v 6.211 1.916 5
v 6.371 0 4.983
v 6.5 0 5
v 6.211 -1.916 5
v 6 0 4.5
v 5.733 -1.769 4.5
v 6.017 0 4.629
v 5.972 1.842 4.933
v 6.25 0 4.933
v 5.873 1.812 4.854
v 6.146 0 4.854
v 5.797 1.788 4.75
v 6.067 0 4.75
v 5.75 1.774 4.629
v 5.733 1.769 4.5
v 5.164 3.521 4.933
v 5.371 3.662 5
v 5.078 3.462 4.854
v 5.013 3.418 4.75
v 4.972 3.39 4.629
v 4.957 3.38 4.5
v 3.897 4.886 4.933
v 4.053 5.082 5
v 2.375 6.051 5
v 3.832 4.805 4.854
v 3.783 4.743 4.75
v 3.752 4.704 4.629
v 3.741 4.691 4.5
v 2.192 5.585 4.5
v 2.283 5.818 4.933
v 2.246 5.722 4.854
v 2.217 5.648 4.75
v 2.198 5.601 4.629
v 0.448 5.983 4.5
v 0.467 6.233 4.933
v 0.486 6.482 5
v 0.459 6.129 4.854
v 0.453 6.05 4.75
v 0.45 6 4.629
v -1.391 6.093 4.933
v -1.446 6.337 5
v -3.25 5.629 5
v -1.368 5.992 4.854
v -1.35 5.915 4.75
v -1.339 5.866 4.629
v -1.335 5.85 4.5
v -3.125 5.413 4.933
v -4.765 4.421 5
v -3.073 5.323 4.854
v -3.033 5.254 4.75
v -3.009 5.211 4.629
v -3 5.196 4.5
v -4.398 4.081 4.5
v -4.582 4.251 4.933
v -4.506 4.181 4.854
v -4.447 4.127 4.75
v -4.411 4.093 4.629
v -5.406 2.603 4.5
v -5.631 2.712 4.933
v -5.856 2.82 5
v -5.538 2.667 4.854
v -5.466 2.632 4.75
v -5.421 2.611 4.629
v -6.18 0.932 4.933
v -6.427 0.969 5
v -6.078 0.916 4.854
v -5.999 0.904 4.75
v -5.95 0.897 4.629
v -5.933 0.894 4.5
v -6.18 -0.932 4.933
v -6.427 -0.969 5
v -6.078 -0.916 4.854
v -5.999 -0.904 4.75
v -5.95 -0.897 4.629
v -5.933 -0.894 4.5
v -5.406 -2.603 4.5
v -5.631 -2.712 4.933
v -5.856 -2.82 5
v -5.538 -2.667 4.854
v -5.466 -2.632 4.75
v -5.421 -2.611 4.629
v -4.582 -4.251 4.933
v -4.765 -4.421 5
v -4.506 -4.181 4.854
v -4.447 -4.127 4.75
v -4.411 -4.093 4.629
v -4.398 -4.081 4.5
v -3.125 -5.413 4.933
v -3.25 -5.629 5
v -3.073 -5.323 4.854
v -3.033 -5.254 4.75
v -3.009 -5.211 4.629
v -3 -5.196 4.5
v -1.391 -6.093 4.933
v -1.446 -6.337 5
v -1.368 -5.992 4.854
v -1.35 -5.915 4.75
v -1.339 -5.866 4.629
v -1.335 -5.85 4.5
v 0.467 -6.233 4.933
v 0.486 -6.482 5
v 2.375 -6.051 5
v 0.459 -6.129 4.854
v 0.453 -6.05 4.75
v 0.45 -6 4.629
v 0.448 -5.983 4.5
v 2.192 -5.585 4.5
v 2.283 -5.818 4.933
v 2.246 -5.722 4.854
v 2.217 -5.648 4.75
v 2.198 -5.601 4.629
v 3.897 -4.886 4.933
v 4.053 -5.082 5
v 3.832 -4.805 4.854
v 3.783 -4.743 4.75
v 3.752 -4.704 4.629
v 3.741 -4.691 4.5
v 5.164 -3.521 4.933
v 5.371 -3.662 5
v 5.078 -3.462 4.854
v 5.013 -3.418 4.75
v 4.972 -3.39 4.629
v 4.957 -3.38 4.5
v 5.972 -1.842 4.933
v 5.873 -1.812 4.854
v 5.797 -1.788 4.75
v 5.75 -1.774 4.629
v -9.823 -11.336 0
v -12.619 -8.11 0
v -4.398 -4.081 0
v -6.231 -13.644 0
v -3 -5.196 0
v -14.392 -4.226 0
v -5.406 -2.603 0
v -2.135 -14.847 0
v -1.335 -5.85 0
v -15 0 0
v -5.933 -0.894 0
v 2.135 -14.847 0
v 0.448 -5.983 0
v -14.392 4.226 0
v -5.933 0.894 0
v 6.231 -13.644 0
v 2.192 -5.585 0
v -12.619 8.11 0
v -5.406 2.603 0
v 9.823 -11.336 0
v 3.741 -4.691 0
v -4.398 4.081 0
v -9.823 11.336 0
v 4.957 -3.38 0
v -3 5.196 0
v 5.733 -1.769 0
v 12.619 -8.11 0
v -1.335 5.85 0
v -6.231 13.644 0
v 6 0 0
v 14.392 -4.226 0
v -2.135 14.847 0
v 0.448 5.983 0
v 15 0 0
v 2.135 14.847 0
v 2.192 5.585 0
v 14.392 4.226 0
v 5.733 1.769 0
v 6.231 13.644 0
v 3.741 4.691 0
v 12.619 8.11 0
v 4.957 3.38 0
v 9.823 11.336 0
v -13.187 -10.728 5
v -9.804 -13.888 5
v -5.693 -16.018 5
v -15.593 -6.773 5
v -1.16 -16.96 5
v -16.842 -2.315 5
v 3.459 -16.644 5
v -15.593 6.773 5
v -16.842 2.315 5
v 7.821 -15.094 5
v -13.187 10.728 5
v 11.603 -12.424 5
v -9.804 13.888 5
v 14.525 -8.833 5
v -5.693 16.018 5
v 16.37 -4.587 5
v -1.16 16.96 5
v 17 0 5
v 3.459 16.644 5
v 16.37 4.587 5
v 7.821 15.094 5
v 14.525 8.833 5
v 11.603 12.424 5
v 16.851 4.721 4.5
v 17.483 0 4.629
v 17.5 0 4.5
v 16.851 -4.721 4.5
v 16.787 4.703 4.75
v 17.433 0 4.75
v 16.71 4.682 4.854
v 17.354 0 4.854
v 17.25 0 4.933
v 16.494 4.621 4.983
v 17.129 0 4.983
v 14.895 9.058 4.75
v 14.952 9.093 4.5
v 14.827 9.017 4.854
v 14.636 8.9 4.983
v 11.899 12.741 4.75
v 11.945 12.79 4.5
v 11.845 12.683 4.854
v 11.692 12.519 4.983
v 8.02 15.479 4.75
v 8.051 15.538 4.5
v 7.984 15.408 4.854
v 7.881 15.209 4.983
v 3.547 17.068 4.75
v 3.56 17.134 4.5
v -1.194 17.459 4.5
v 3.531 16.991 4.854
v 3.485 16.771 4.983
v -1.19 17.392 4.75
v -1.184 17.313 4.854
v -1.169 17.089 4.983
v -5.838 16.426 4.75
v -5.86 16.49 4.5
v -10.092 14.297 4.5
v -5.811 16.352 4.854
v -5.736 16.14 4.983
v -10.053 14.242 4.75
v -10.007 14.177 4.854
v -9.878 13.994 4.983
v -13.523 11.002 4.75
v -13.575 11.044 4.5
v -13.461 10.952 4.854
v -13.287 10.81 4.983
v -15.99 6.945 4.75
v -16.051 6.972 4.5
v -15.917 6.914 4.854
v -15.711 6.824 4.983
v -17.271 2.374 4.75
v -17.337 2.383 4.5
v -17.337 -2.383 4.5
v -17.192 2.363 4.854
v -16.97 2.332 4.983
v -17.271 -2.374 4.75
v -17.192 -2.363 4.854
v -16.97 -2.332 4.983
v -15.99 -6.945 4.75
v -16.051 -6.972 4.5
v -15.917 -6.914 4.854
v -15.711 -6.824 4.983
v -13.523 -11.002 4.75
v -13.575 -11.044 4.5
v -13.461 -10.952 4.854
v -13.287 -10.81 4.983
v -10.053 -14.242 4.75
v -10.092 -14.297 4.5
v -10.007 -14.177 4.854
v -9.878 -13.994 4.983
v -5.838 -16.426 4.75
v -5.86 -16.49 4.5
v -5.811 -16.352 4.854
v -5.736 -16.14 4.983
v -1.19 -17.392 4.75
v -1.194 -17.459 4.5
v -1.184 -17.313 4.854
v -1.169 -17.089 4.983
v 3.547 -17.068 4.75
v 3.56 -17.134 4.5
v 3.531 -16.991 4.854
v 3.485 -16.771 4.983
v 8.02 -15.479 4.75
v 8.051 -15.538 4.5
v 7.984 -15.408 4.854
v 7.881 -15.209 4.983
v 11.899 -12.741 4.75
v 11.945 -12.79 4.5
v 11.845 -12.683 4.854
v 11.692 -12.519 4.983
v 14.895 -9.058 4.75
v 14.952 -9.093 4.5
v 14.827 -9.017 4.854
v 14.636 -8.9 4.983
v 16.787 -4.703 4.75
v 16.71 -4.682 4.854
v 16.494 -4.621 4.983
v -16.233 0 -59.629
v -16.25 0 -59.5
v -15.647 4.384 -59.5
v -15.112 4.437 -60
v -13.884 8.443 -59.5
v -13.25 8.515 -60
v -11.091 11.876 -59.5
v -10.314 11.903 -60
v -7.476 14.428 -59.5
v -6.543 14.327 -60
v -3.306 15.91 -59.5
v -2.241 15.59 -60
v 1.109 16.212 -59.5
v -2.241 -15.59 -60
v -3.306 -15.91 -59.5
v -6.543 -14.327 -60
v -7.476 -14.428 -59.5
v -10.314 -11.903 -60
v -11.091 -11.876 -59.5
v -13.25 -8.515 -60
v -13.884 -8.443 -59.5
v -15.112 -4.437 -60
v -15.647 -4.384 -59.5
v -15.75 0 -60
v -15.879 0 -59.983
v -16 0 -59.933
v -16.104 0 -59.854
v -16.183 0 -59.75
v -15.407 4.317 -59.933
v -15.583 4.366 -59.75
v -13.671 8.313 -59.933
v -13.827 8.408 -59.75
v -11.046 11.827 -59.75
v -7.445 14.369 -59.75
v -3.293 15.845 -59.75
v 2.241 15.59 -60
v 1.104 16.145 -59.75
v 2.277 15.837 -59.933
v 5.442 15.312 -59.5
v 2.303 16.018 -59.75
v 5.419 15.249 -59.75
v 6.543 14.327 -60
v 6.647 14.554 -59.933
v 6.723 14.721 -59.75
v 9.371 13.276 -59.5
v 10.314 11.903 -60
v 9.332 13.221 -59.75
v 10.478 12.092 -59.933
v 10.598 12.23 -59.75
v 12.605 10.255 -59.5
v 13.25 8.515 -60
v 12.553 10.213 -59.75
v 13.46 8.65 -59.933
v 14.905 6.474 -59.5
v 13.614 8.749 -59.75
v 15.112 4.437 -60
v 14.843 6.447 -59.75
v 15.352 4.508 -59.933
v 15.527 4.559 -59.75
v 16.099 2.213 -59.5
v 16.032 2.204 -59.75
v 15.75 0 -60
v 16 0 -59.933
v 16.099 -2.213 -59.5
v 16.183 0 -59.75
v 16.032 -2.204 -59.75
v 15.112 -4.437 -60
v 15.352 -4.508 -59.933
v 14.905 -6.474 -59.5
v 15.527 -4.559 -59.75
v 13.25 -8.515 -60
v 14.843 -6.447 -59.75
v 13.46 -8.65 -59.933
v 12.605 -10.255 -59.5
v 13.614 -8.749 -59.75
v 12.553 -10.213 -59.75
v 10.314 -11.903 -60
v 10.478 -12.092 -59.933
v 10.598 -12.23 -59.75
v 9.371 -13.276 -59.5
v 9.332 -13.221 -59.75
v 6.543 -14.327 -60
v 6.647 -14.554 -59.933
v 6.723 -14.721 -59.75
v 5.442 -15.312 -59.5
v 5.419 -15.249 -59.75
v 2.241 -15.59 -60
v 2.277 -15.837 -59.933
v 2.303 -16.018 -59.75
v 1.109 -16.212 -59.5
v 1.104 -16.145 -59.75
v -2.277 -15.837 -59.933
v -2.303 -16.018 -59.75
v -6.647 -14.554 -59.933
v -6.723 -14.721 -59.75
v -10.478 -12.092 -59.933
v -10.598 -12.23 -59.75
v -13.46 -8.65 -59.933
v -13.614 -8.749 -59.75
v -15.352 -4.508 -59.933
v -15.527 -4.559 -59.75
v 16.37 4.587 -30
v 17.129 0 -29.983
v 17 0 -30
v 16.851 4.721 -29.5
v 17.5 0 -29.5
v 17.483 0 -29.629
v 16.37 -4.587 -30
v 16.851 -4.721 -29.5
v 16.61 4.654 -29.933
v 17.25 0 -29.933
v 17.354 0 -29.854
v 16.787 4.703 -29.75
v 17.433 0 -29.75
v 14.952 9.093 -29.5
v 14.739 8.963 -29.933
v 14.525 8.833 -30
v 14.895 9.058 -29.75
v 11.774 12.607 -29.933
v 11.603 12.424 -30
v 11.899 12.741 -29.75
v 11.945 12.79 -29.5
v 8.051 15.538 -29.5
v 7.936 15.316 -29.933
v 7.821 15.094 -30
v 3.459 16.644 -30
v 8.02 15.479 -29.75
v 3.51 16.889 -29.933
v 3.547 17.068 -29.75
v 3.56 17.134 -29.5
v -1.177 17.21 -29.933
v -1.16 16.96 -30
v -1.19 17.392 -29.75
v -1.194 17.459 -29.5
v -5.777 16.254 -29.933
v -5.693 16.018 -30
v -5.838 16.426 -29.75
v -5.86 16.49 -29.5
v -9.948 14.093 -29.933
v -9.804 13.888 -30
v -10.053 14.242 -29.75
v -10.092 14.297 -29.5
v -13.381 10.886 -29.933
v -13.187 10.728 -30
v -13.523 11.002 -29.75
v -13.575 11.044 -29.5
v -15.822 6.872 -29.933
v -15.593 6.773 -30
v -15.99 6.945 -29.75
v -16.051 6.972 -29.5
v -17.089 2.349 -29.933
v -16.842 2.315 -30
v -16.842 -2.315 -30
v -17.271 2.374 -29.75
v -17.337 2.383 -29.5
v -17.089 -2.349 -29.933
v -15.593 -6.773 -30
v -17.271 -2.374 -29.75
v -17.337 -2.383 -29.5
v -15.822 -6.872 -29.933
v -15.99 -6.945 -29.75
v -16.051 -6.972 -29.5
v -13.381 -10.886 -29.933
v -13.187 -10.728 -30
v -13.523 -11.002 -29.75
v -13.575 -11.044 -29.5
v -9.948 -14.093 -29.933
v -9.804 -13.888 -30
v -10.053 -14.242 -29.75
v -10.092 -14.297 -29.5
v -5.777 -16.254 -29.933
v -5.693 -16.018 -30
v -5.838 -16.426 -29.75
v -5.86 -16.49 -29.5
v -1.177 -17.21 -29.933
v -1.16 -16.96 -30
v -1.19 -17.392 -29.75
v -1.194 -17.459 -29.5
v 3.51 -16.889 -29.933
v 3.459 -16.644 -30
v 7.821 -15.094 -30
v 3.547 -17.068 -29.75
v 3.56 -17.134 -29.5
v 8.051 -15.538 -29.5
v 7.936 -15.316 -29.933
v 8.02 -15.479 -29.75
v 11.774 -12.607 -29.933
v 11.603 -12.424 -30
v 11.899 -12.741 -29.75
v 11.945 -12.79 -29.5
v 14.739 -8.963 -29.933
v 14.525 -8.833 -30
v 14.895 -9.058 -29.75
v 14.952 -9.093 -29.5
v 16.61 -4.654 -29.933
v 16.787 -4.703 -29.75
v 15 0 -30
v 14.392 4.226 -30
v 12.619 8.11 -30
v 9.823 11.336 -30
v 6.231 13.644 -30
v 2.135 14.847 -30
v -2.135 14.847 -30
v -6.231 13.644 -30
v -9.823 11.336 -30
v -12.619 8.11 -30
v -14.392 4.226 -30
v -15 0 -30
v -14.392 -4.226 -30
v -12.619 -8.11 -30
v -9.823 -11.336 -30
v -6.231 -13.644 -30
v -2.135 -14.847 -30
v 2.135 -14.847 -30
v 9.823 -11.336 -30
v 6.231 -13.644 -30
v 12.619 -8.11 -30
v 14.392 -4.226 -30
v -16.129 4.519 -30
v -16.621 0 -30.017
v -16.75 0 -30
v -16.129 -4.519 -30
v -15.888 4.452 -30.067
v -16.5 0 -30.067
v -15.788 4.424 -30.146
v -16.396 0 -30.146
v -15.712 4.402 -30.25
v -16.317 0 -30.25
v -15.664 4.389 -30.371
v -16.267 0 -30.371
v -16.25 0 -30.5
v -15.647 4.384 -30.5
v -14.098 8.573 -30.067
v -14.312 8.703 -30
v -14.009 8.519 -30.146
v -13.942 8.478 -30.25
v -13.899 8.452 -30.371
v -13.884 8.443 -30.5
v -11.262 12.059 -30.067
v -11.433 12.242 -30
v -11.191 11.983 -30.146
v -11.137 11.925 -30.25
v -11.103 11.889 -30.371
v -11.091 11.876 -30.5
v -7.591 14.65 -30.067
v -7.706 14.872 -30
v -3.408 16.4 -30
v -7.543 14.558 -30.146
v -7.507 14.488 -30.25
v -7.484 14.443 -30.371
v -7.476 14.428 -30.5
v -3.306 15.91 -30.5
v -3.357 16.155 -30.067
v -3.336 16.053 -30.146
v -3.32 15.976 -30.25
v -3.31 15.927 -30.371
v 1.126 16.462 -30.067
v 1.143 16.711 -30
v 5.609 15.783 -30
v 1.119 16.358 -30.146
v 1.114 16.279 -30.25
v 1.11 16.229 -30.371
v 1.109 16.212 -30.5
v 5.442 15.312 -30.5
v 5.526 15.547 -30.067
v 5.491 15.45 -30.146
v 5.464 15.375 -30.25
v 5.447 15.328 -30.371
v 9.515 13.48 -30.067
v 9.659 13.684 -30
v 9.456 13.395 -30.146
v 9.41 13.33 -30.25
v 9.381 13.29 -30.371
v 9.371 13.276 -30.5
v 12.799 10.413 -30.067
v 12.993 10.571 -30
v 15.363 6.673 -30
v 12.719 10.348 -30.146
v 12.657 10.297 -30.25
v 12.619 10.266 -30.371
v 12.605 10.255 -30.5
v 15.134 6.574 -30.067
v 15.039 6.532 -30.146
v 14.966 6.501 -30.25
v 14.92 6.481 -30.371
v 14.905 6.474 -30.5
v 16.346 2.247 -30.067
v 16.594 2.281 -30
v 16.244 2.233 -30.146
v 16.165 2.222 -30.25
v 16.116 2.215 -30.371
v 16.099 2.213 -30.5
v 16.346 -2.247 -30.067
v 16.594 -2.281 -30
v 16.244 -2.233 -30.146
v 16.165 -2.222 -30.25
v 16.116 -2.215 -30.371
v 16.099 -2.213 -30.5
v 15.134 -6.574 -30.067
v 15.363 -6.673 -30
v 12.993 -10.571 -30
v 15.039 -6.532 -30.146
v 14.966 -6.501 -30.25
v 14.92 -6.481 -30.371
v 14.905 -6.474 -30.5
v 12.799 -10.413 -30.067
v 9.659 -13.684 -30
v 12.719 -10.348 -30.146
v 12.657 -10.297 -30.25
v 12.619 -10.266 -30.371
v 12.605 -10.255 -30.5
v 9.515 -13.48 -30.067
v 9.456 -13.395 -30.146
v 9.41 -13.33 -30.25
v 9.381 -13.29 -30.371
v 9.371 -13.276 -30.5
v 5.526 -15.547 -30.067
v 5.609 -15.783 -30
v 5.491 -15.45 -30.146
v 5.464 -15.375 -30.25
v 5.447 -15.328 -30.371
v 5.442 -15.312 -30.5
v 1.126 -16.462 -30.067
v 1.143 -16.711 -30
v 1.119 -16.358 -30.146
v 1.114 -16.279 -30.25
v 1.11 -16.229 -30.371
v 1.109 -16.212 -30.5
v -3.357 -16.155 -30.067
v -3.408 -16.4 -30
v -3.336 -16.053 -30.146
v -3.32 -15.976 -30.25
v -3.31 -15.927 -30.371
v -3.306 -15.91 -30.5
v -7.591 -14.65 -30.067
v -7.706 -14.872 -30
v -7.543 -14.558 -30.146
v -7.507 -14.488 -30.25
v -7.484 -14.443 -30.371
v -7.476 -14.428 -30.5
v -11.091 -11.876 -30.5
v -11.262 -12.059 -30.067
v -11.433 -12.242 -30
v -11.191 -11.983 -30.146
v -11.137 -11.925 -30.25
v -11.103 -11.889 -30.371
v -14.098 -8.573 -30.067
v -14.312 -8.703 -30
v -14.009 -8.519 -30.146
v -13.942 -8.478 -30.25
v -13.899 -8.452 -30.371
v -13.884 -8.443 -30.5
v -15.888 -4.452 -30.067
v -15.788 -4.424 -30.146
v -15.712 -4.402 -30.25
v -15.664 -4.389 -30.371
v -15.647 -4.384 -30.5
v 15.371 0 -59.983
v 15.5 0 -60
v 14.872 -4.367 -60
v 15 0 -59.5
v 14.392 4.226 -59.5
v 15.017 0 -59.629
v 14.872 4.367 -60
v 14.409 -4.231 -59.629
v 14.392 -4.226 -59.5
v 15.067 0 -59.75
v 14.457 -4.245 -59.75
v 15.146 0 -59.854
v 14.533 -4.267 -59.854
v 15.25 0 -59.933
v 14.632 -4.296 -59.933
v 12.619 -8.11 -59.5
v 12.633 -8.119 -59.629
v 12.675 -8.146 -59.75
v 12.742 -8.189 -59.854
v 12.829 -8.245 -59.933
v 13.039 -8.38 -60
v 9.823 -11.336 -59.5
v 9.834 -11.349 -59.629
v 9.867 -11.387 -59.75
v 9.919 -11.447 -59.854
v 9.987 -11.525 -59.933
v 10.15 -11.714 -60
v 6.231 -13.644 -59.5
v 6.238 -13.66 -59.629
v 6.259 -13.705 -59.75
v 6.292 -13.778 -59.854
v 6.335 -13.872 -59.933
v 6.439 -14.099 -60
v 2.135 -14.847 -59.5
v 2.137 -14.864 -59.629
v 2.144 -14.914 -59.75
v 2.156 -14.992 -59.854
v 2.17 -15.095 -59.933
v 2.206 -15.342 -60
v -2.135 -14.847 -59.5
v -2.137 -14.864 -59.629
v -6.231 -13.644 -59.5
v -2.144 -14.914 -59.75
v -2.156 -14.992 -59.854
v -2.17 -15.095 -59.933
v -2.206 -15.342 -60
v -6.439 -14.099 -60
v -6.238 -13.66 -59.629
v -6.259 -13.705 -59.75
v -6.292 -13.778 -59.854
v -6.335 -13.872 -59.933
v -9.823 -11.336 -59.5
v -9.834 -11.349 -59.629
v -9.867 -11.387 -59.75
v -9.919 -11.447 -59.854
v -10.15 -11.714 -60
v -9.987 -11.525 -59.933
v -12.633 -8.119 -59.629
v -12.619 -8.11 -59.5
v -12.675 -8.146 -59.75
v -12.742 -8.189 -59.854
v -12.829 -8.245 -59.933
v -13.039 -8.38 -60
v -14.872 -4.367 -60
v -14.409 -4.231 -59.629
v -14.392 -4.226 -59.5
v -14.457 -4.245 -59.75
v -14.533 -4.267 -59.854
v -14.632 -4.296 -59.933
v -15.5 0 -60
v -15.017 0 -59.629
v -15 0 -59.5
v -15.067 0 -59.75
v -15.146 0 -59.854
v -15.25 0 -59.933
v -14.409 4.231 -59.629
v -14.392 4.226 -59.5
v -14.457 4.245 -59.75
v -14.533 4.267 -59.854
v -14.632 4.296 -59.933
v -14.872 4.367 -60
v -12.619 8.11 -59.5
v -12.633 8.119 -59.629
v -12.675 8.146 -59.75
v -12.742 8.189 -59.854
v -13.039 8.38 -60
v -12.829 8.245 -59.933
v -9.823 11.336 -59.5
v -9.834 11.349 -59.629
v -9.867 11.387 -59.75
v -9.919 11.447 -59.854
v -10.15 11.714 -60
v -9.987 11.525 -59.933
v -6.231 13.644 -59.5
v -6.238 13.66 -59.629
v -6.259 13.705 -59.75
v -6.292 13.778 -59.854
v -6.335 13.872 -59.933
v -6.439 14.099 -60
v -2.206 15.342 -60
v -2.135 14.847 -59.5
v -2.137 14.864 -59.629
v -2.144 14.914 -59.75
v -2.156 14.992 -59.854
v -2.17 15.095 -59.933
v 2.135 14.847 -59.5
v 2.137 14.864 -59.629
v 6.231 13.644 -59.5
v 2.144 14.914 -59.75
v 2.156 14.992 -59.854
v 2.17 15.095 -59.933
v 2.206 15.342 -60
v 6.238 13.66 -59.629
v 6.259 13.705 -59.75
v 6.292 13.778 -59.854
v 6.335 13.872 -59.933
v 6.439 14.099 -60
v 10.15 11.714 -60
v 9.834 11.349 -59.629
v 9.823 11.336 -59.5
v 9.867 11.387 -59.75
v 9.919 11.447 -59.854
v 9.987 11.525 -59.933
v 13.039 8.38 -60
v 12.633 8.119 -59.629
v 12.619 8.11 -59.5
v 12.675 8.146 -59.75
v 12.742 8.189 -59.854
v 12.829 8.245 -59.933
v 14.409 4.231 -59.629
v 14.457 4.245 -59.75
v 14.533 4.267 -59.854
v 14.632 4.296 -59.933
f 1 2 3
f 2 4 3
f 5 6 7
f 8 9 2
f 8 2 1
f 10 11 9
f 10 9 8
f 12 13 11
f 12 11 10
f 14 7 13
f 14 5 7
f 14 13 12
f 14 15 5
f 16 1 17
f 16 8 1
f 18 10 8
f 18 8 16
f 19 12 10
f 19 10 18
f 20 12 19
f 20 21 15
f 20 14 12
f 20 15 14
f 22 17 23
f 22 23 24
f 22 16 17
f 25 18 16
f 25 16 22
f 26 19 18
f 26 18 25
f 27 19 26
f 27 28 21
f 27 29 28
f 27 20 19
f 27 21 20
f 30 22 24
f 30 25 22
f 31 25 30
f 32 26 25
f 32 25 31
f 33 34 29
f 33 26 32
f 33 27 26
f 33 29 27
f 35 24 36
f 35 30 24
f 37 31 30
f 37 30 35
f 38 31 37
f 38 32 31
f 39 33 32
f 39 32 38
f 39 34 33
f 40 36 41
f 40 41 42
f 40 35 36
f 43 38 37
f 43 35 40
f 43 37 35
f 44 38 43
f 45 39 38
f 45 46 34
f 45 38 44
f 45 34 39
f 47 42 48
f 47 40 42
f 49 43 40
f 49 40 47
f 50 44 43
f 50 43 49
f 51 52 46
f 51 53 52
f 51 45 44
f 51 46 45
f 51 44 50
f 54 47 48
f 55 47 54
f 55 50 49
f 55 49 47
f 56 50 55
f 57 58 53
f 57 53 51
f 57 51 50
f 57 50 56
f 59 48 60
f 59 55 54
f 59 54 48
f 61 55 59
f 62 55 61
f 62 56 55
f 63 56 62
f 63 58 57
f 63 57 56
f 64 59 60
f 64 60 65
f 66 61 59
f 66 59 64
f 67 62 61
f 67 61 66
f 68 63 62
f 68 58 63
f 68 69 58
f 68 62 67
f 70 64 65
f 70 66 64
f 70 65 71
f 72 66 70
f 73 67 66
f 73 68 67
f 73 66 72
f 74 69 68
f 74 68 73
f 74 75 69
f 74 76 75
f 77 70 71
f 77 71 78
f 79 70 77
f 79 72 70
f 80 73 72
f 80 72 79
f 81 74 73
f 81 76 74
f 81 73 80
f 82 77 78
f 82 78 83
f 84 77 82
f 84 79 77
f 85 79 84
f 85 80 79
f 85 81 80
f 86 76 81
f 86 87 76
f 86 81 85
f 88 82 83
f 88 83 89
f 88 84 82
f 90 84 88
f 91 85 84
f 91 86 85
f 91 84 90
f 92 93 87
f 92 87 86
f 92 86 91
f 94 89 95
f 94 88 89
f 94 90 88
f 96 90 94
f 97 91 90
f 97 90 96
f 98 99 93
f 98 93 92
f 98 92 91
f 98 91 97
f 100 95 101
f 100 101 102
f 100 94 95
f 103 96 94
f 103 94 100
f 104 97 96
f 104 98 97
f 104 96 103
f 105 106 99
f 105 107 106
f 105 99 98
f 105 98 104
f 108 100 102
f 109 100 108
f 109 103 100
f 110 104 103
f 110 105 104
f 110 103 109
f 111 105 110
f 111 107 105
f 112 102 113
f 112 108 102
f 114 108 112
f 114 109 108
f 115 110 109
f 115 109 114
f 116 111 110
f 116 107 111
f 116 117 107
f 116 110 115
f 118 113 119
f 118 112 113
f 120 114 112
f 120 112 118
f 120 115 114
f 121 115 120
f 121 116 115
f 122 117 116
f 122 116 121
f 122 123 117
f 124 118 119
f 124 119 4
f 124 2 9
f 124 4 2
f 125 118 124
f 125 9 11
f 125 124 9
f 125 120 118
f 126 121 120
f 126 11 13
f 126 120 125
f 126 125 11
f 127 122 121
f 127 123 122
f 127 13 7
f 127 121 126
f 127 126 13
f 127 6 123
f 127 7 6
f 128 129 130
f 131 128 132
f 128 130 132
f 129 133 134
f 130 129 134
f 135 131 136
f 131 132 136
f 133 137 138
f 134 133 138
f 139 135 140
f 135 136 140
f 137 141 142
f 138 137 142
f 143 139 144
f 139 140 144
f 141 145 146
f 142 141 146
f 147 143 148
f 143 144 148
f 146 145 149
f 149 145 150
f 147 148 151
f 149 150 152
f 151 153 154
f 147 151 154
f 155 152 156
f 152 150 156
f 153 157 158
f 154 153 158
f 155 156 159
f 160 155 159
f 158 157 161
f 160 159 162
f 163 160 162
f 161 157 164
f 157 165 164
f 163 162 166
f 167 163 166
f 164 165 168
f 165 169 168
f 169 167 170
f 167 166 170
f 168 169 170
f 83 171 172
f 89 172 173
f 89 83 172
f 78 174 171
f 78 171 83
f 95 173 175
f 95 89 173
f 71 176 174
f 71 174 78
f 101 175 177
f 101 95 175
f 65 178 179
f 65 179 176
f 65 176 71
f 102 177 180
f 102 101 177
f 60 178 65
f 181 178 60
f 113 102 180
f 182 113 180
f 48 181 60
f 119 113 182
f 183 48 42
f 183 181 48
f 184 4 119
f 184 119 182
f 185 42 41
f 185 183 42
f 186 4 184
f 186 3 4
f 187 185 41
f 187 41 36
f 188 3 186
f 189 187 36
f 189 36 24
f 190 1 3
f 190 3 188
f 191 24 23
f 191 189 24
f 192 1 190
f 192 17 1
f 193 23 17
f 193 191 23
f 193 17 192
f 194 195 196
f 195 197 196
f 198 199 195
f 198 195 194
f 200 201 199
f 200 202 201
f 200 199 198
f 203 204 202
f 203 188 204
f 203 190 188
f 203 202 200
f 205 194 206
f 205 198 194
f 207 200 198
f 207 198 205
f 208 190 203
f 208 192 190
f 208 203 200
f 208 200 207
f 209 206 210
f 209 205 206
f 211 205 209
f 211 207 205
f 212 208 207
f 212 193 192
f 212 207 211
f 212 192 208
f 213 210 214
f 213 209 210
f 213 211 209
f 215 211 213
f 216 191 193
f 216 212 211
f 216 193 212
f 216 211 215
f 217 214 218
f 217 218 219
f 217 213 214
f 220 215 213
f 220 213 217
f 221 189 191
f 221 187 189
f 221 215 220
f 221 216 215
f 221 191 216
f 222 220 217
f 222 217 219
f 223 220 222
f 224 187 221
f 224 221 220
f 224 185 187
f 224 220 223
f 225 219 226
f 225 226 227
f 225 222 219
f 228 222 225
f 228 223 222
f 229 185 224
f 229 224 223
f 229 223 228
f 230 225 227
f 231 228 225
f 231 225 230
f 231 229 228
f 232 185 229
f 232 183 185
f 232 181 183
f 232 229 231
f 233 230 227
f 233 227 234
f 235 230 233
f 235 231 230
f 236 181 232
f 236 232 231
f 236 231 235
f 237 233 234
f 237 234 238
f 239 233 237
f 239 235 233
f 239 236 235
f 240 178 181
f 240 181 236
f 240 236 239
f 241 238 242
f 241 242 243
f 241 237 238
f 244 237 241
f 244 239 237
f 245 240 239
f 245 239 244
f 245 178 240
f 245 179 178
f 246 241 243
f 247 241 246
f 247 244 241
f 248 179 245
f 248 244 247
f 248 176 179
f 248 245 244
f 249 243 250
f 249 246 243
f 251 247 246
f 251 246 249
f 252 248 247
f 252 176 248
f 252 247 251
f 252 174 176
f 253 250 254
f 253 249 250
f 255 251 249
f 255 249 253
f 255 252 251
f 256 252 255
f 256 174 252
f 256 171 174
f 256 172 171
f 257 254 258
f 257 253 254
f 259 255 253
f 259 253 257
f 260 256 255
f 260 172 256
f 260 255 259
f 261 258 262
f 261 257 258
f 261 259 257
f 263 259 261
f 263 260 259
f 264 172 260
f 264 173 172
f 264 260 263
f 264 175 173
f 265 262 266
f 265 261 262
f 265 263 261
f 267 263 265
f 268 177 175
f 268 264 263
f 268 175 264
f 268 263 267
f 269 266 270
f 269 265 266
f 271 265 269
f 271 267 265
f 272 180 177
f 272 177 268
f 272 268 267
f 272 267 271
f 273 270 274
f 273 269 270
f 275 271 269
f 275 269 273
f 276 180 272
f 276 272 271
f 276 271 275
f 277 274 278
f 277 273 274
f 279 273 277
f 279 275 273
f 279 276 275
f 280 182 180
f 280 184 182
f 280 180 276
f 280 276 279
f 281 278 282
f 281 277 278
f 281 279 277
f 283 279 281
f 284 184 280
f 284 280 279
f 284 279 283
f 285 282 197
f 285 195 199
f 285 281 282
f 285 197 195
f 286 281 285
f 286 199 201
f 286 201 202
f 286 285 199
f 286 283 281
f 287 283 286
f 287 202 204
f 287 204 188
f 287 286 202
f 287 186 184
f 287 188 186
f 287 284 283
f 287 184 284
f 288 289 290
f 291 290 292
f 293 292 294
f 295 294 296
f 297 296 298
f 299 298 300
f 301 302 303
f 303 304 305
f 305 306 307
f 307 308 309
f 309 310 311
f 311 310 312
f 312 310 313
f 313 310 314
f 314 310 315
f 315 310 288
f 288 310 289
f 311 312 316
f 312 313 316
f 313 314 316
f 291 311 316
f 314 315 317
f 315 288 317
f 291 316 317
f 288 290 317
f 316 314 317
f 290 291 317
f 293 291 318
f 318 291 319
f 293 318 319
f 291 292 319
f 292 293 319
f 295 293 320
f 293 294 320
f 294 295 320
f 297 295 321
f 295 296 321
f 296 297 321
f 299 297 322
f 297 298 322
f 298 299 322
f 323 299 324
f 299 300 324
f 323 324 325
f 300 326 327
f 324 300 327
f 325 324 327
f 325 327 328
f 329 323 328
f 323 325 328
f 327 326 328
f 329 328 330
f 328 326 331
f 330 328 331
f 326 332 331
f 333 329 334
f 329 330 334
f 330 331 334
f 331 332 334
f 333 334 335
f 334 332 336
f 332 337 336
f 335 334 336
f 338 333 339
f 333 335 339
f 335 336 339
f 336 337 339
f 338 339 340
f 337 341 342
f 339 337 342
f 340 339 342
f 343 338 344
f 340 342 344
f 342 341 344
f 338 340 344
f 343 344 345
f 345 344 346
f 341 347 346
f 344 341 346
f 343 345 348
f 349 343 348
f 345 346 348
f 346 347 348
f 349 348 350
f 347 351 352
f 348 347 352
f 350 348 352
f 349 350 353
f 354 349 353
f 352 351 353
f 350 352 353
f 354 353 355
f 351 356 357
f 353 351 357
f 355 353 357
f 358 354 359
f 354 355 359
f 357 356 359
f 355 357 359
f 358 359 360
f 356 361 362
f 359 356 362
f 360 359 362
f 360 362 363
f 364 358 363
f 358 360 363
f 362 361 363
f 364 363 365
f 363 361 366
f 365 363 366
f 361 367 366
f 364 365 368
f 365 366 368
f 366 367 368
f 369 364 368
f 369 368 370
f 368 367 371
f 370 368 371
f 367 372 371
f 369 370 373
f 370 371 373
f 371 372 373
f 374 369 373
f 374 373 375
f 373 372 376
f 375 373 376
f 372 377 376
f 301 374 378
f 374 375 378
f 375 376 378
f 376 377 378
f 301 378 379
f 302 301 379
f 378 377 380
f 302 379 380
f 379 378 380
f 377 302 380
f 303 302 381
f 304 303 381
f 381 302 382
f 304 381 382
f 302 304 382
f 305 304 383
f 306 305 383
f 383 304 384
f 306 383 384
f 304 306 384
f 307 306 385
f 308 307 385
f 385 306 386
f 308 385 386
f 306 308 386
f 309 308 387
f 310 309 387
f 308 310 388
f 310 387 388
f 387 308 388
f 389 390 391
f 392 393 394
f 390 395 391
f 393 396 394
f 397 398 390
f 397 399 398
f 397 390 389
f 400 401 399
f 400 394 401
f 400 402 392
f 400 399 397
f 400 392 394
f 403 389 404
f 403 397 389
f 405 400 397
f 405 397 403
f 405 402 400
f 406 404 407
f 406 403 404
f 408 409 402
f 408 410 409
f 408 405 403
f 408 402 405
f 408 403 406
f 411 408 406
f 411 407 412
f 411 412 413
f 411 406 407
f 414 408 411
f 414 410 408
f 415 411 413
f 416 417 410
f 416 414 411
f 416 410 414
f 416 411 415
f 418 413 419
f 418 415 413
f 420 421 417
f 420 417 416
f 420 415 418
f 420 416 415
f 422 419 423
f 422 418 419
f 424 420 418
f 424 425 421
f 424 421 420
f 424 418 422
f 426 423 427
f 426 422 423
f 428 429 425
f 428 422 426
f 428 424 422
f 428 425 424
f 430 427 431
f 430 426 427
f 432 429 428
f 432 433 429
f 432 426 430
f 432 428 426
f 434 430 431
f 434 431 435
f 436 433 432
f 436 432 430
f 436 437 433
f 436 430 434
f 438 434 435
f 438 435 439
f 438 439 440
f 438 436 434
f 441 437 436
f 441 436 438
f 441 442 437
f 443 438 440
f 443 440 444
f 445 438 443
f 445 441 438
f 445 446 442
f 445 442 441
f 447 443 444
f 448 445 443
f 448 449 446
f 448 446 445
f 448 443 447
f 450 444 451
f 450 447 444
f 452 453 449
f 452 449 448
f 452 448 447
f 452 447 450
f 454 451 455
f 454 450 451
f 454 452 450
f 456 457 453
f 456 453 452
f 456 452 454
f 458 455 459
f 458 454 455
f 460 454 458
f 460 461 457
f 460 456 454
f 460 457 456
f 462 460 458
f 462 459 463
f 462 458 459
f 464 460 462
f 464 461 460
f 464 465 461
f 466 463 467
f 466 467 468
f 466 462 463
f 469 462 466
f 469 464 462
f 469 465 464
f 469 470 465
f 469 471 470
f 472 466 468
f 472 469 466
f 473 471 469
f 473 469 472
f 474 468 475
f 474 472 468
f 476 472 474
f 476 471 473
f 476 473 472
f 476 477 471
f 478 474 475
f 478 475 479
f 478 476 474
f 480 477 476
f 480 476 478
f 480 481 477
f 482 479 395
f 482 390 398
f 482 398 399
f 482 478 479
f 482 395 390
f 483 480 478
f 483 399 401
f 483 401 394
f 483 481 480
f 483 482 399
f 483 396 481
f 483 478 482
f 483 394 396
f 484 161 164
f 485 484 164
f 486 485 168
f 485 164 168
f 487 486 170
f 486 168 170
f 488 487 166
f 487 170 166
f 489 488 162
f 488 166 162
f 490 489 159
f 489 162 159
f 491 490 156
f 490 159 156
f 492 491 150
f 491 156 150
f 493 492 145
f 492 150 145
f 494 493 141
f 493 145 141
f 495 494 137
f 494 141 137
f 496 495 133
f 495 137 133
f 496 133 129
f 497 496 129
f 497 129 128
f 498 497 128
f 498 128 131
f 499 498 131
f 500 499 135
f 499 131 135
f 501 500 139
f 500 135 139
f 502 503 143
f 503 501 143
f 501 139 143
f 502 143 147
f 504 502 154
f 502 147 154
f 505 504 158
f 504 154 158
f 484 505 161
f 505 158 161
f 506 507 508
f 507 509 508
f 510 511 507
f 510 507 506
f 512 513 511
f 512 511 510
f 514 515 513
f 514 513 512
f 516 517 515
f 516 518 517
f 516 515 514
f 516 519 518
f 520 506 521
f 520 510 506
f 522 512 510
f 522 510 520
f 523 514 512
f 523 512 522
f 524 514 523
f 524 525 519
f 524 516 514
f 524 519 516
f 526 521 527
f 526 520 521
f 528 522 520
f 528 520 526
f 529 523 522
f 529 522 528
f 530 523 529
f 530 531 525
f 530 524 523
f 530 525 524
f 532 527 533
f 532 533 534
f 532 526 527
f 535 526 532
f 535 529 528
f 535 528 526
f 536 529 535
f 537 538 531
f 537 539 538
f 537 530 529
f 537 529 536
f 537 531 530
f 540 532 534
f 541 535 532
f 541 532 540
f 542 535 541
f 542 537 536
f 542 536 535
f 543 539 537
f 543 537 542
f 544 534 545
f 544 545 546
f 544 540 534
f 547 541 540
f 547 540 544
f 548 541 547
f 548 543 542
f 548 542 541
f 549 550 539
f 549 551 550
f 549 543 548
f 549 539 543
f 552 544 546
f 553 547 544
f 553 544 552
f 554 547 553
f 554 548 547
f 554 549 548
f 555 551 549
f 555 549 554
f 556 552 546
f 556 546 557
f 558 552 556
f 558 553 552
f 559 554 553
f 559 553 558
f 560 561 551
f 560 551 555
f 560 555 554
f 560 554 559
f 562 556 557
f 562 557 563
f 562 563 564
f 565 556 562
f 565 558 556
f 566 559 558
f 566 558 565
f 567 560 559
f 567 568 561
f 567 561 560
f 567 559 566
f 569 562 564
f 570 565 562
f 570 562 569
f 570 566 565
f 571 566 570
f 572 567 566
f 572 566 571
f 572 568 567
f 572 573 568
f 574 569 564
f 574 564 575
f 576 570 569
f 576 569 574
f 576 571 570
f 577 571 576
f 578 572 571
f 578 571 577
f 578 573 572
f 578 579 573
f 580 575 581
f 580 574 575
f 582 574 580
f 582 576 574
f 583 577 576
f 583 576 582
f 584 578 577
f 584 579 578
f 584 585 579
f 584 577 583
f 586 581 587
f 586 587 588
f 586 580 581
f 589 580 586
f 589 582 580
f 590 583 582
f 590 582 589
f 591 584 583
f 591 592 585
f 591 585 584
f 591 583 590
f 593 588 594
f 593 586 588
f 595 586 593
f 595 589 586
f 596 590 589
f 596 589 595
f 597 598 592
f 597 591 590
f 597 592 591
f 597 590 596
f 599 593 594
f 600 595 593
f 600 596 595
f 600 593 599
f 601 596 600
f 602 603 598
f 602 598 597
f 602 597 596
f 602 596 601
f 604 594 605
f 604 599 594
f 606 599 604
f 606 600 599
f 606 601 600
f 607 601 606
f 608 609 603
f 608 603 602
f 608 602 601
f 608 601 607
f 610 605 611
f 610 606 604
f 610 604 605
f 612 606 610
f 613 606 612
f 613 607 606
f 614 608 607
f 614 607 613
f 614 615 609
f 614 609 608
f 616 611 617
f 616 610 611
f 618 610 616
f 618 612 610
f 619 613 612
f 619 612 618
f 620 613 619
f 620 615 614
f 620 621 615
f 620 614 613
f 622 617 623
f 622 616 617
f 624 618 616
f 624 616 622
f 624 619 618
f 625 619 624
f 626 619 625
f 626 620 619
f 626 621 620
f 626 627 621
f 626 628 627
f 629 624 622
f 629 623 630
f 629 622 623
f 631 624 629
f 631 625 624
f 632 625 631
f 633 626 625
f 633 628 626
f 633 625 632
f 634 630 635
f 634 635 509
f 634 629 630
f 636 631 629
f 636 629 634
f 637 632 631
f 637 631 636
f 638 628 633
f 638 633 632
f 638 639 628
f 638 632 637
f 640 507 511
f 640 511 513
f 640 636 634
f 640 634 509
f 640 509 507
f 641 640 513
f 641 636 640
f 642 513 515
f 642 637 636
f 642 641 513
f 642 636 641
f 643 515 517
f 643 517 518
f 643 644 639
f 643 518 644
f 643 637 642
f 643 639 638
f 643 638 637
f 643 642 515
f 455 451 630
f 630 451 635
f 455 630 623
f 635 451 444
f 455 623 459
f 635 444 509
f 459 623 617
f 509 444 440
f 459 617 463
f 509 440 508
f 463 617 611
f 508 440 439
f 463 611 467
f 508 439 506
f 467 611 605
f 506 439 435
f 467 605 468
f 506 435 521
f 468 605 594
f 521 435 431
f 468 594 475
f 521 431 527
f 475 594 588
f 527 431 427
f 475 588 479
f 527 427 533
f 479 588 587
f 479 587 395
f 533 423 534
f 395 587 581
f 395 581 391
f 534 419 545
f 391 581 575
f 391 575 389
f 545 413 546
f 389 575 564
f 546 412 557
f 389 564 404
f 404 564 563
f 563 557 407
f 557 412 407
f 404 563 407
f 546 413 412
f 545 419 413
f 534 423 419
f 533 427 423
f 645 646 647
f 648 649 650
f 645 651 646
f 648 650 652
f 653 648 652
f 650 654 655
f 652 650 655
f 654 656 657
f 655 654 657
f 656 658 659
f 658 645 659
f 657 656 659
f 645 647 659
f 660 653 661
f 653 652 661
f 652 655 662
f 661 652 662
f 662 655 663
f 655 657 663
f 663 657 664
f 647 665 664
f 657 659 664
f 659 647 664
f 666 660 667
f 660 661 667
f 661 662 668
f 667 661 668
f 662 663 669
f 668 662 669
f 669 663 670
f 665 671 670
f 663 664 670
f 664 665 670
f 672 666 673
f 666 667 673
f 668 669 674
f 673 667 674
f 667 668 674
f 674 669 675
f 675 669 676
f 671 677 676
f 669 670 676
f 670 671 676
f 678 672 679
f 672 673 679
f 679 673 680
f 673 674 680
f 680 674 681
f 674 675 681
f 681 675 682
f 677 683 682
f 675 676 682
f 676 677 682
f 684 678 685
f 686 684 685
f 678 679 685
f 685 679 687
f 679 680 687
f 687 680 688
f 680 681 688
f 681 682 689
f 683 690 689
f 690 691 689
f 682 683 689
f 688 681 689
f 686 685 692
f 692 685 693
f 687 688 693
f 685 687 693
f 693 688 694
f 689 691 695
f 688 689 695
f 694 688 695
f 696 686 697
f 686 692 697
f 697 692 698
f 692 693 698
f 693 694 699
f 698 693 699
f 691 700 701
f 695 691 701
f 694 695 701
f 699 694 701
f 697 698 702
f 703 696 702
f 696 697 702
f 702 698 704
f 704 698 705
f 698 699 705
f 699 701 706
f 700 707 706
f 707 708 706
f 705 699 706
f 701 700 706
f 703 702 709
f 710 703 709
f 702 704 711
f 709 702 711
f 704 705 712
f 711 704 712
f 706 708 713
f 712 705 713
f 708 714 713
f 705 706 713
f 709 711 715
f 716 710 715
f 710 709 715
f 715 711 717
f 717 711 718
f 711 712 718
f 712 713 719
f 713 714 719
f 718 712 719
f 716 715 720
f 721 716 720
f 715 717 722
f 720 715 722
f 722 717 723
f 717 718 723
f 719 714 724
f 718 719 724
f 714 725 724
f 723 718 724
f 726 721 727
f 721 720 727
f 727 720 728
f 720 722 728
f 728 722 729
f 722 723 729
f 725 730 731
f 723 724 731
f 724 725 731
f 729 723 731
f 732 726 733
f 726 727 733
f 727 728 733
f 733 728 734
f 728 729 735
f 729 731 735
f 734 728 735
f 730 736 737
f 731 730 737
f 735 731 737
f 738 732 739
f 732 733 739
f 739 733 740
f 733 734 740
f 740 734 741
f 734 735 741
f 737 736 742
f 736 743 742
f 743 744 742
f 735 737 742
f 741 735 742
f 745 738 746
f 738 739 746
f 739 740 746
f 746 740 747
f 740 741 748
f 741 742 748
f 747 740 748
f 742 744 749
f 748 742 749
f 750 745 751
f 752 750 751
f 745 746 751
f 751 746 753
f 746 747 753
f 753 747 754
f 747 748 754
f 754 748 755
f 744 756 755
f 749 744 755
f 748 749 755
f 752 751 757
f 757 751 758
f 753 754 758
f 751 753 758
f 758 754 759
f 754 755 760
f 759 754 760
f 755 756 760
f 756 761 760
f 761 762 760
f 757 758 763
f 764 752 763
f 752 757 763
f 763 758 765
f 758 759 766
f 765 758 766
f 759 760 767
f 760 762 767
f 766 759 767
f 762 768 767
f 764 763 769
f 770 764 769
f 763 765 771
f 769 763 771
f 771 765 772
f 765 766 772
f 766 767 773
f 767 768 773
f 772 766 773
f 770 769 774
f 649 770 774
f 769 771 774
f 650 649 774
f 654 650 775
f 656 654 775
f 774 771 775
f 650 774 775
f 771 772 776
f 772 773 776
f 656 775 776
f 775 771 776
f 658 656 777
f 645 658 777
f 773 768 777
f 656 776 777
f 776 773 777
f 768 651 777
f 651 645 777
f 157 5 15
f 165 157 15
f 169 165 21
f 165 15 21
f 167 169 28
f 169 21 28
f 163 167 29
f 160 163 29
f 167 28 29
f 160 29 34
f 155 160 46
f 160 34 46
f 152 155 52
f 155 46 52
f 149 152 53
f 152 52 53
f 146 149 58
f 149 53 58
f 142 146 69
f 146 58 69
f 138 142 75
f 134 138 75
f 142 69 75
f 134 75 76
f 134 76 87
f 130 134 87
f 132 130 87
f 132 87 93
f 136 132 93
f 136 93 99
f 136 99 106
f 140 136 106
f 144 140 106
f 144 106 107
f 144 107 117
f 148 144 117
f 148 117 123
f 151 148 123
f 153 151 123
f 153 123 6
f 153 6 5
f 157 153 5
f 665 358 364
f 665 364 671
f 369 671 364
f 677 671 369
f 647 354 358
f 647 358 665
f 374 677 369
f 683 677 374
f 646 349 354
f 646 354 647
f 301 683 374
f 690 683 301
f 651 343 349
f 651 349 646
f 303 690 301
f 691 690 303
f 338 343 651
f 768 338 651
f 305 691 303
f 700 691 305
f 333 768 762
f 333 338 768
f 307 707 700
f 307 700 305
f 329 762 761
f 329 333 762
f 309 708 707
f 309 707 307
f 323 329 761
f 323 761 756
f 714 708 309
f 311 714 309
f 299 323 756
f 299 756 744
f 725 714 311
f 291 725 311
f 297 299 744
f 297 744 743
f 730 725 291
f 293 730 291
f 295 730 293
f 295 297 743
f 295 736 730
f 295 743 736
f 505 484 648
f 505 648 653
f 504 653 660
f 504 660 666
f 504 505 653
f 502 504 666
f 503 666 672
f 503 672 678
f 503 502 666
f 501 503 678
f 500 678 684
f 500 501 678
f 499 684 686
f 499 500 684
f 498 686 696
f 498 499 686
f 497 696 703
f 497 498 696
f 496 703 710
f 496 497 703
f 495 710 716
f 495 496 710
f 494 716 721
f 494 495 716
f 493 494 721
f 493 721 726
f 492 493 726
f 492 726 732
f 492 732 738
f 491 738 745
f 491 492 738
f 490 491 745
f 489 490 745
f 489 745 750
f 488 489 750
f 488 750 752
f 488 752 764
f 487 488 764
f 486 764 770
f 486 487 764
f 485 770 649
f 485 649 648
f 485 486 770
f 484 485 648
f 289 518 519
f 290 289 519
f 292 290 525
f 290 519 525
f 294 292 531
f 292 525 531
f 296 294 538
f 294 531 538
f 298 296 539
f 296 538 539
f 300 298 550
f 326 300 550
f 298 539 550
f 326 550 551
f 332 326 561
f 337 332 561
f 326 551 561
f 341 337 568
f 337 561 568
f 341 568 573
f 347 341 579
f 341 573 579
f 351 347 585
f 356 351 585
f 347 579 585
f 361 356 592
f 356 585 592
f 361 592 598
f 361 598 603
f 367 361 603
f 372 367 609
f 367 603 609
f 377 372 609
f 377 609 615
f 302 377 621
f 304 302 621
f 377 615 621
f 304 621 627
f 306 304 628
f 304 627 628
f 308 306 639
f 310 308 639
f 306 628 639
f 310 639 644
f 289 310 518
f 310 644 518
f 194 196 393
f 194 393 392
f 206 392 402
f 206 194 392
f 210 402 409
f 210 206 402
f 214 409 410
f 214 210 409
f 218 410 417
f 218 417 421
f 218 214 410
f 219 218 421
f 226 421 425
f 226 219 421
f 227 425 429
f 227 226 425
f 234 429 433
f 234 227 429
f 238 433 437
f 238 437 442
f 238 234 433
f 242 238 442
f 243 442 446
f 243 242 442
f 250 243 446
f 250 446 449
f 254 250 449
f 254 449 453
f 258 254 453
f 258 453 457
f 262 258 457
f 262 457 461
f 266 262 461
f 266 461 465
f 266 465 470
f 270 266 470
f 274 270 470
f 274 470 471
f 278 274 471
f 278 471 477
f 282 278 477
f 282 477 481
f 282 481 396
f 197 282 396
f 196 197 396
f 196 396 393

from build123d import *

# Parameters (mm, degrees)
SKETCH1_R           = 17.5
SKETCH1_R_2         = 15
BOSS_EXTRUDE1_DEPTH = 30
SKETCH2_R           = 16.25
SKETCH2_R_2         = 15
BOSS_EXTRUDE2_DEPTH = 30
SKETCH3_R           = 17.5
BOSS_EXTRUDE3_DEPTH = 5
SKETCH4_R           = 6
CUT_EXTRUDE1_DEPTH  = 10
FILLET2_R           = 0.5
FILLET3_R           = 0.5
FILLET4_R           = 0.5


with BuildPart() as part:
    # Sketch1 → Boss-Extrude1 (new body)
    with BuildSketch(Plane.XY):
        Circle(SKETCH1_R)
        Circle(SKETCH1_R_2, mode=Mode.SUBTRACT)
    extrude(amount=-BOSS_EXTRUDE1_DEPTH)

    # Sketch3 → Boss-Extrude3 (add)
    with BuildSketch(Plane.XY):
        Circle(SKETCH3_R)
    extrude(amount=BOSS_EXTRUDE3_DEPTH)

    # Sketch4 → Cut-Extrude1 (cut)
    with BuildSketch(Plane.XY.offset(5)):
        Circle(SKETCH4_R)
    extrude(amount=-CUT_EXTRUDE1_DEPTH, mode=Mode.SUBTRACT)


with BuildPart() as body_2:
    # Sketch2 → Boss-Extrude2 (new body)
    with BuildSketch(Plane(origin=(0, 0, -30), x_dir=(-1, 0, 0), z_dir=(0, 0, -1))):
        Circle(SKETCH2_R)
        with Locations(Location((0, 0, 0), (0, 0, 180))):
            Circle(SKETCH2_R_2, mode=Mode.SUBTRACT)
    extrude(amount=BOSS_EXTRUDE2_DEPTH)

    # Combine1: union part
    add(part.part)

    # Fillet2
    fillet2_edges = [body_2.edges().sort_by_distance(p)[0] for p in [
        (16.25, 0, -30),
    ]]
    fillet(fillet2_edges, radius=FILLET2_R)

    # Fillet3
    fillet3_edges = [body_2.edges().sort_by_distance(p)[0] for p in [
        (-17.5, 0, -30),
        (16.25, 0, -60),
        (-15, 0, -60),
    ]]
    fillet(fillet3_edges, radius=FILLET3_R)

    # Fillet4
    fillet4_edges = [body_2.edges().sort_by_distance(p)[0] for p in [
        (-17.5, 0, 5),
        (-6, 0, 5),
    ]]
    fillet(fillet4_edges, radius=FILLET4_R)


solid = body_2.part
